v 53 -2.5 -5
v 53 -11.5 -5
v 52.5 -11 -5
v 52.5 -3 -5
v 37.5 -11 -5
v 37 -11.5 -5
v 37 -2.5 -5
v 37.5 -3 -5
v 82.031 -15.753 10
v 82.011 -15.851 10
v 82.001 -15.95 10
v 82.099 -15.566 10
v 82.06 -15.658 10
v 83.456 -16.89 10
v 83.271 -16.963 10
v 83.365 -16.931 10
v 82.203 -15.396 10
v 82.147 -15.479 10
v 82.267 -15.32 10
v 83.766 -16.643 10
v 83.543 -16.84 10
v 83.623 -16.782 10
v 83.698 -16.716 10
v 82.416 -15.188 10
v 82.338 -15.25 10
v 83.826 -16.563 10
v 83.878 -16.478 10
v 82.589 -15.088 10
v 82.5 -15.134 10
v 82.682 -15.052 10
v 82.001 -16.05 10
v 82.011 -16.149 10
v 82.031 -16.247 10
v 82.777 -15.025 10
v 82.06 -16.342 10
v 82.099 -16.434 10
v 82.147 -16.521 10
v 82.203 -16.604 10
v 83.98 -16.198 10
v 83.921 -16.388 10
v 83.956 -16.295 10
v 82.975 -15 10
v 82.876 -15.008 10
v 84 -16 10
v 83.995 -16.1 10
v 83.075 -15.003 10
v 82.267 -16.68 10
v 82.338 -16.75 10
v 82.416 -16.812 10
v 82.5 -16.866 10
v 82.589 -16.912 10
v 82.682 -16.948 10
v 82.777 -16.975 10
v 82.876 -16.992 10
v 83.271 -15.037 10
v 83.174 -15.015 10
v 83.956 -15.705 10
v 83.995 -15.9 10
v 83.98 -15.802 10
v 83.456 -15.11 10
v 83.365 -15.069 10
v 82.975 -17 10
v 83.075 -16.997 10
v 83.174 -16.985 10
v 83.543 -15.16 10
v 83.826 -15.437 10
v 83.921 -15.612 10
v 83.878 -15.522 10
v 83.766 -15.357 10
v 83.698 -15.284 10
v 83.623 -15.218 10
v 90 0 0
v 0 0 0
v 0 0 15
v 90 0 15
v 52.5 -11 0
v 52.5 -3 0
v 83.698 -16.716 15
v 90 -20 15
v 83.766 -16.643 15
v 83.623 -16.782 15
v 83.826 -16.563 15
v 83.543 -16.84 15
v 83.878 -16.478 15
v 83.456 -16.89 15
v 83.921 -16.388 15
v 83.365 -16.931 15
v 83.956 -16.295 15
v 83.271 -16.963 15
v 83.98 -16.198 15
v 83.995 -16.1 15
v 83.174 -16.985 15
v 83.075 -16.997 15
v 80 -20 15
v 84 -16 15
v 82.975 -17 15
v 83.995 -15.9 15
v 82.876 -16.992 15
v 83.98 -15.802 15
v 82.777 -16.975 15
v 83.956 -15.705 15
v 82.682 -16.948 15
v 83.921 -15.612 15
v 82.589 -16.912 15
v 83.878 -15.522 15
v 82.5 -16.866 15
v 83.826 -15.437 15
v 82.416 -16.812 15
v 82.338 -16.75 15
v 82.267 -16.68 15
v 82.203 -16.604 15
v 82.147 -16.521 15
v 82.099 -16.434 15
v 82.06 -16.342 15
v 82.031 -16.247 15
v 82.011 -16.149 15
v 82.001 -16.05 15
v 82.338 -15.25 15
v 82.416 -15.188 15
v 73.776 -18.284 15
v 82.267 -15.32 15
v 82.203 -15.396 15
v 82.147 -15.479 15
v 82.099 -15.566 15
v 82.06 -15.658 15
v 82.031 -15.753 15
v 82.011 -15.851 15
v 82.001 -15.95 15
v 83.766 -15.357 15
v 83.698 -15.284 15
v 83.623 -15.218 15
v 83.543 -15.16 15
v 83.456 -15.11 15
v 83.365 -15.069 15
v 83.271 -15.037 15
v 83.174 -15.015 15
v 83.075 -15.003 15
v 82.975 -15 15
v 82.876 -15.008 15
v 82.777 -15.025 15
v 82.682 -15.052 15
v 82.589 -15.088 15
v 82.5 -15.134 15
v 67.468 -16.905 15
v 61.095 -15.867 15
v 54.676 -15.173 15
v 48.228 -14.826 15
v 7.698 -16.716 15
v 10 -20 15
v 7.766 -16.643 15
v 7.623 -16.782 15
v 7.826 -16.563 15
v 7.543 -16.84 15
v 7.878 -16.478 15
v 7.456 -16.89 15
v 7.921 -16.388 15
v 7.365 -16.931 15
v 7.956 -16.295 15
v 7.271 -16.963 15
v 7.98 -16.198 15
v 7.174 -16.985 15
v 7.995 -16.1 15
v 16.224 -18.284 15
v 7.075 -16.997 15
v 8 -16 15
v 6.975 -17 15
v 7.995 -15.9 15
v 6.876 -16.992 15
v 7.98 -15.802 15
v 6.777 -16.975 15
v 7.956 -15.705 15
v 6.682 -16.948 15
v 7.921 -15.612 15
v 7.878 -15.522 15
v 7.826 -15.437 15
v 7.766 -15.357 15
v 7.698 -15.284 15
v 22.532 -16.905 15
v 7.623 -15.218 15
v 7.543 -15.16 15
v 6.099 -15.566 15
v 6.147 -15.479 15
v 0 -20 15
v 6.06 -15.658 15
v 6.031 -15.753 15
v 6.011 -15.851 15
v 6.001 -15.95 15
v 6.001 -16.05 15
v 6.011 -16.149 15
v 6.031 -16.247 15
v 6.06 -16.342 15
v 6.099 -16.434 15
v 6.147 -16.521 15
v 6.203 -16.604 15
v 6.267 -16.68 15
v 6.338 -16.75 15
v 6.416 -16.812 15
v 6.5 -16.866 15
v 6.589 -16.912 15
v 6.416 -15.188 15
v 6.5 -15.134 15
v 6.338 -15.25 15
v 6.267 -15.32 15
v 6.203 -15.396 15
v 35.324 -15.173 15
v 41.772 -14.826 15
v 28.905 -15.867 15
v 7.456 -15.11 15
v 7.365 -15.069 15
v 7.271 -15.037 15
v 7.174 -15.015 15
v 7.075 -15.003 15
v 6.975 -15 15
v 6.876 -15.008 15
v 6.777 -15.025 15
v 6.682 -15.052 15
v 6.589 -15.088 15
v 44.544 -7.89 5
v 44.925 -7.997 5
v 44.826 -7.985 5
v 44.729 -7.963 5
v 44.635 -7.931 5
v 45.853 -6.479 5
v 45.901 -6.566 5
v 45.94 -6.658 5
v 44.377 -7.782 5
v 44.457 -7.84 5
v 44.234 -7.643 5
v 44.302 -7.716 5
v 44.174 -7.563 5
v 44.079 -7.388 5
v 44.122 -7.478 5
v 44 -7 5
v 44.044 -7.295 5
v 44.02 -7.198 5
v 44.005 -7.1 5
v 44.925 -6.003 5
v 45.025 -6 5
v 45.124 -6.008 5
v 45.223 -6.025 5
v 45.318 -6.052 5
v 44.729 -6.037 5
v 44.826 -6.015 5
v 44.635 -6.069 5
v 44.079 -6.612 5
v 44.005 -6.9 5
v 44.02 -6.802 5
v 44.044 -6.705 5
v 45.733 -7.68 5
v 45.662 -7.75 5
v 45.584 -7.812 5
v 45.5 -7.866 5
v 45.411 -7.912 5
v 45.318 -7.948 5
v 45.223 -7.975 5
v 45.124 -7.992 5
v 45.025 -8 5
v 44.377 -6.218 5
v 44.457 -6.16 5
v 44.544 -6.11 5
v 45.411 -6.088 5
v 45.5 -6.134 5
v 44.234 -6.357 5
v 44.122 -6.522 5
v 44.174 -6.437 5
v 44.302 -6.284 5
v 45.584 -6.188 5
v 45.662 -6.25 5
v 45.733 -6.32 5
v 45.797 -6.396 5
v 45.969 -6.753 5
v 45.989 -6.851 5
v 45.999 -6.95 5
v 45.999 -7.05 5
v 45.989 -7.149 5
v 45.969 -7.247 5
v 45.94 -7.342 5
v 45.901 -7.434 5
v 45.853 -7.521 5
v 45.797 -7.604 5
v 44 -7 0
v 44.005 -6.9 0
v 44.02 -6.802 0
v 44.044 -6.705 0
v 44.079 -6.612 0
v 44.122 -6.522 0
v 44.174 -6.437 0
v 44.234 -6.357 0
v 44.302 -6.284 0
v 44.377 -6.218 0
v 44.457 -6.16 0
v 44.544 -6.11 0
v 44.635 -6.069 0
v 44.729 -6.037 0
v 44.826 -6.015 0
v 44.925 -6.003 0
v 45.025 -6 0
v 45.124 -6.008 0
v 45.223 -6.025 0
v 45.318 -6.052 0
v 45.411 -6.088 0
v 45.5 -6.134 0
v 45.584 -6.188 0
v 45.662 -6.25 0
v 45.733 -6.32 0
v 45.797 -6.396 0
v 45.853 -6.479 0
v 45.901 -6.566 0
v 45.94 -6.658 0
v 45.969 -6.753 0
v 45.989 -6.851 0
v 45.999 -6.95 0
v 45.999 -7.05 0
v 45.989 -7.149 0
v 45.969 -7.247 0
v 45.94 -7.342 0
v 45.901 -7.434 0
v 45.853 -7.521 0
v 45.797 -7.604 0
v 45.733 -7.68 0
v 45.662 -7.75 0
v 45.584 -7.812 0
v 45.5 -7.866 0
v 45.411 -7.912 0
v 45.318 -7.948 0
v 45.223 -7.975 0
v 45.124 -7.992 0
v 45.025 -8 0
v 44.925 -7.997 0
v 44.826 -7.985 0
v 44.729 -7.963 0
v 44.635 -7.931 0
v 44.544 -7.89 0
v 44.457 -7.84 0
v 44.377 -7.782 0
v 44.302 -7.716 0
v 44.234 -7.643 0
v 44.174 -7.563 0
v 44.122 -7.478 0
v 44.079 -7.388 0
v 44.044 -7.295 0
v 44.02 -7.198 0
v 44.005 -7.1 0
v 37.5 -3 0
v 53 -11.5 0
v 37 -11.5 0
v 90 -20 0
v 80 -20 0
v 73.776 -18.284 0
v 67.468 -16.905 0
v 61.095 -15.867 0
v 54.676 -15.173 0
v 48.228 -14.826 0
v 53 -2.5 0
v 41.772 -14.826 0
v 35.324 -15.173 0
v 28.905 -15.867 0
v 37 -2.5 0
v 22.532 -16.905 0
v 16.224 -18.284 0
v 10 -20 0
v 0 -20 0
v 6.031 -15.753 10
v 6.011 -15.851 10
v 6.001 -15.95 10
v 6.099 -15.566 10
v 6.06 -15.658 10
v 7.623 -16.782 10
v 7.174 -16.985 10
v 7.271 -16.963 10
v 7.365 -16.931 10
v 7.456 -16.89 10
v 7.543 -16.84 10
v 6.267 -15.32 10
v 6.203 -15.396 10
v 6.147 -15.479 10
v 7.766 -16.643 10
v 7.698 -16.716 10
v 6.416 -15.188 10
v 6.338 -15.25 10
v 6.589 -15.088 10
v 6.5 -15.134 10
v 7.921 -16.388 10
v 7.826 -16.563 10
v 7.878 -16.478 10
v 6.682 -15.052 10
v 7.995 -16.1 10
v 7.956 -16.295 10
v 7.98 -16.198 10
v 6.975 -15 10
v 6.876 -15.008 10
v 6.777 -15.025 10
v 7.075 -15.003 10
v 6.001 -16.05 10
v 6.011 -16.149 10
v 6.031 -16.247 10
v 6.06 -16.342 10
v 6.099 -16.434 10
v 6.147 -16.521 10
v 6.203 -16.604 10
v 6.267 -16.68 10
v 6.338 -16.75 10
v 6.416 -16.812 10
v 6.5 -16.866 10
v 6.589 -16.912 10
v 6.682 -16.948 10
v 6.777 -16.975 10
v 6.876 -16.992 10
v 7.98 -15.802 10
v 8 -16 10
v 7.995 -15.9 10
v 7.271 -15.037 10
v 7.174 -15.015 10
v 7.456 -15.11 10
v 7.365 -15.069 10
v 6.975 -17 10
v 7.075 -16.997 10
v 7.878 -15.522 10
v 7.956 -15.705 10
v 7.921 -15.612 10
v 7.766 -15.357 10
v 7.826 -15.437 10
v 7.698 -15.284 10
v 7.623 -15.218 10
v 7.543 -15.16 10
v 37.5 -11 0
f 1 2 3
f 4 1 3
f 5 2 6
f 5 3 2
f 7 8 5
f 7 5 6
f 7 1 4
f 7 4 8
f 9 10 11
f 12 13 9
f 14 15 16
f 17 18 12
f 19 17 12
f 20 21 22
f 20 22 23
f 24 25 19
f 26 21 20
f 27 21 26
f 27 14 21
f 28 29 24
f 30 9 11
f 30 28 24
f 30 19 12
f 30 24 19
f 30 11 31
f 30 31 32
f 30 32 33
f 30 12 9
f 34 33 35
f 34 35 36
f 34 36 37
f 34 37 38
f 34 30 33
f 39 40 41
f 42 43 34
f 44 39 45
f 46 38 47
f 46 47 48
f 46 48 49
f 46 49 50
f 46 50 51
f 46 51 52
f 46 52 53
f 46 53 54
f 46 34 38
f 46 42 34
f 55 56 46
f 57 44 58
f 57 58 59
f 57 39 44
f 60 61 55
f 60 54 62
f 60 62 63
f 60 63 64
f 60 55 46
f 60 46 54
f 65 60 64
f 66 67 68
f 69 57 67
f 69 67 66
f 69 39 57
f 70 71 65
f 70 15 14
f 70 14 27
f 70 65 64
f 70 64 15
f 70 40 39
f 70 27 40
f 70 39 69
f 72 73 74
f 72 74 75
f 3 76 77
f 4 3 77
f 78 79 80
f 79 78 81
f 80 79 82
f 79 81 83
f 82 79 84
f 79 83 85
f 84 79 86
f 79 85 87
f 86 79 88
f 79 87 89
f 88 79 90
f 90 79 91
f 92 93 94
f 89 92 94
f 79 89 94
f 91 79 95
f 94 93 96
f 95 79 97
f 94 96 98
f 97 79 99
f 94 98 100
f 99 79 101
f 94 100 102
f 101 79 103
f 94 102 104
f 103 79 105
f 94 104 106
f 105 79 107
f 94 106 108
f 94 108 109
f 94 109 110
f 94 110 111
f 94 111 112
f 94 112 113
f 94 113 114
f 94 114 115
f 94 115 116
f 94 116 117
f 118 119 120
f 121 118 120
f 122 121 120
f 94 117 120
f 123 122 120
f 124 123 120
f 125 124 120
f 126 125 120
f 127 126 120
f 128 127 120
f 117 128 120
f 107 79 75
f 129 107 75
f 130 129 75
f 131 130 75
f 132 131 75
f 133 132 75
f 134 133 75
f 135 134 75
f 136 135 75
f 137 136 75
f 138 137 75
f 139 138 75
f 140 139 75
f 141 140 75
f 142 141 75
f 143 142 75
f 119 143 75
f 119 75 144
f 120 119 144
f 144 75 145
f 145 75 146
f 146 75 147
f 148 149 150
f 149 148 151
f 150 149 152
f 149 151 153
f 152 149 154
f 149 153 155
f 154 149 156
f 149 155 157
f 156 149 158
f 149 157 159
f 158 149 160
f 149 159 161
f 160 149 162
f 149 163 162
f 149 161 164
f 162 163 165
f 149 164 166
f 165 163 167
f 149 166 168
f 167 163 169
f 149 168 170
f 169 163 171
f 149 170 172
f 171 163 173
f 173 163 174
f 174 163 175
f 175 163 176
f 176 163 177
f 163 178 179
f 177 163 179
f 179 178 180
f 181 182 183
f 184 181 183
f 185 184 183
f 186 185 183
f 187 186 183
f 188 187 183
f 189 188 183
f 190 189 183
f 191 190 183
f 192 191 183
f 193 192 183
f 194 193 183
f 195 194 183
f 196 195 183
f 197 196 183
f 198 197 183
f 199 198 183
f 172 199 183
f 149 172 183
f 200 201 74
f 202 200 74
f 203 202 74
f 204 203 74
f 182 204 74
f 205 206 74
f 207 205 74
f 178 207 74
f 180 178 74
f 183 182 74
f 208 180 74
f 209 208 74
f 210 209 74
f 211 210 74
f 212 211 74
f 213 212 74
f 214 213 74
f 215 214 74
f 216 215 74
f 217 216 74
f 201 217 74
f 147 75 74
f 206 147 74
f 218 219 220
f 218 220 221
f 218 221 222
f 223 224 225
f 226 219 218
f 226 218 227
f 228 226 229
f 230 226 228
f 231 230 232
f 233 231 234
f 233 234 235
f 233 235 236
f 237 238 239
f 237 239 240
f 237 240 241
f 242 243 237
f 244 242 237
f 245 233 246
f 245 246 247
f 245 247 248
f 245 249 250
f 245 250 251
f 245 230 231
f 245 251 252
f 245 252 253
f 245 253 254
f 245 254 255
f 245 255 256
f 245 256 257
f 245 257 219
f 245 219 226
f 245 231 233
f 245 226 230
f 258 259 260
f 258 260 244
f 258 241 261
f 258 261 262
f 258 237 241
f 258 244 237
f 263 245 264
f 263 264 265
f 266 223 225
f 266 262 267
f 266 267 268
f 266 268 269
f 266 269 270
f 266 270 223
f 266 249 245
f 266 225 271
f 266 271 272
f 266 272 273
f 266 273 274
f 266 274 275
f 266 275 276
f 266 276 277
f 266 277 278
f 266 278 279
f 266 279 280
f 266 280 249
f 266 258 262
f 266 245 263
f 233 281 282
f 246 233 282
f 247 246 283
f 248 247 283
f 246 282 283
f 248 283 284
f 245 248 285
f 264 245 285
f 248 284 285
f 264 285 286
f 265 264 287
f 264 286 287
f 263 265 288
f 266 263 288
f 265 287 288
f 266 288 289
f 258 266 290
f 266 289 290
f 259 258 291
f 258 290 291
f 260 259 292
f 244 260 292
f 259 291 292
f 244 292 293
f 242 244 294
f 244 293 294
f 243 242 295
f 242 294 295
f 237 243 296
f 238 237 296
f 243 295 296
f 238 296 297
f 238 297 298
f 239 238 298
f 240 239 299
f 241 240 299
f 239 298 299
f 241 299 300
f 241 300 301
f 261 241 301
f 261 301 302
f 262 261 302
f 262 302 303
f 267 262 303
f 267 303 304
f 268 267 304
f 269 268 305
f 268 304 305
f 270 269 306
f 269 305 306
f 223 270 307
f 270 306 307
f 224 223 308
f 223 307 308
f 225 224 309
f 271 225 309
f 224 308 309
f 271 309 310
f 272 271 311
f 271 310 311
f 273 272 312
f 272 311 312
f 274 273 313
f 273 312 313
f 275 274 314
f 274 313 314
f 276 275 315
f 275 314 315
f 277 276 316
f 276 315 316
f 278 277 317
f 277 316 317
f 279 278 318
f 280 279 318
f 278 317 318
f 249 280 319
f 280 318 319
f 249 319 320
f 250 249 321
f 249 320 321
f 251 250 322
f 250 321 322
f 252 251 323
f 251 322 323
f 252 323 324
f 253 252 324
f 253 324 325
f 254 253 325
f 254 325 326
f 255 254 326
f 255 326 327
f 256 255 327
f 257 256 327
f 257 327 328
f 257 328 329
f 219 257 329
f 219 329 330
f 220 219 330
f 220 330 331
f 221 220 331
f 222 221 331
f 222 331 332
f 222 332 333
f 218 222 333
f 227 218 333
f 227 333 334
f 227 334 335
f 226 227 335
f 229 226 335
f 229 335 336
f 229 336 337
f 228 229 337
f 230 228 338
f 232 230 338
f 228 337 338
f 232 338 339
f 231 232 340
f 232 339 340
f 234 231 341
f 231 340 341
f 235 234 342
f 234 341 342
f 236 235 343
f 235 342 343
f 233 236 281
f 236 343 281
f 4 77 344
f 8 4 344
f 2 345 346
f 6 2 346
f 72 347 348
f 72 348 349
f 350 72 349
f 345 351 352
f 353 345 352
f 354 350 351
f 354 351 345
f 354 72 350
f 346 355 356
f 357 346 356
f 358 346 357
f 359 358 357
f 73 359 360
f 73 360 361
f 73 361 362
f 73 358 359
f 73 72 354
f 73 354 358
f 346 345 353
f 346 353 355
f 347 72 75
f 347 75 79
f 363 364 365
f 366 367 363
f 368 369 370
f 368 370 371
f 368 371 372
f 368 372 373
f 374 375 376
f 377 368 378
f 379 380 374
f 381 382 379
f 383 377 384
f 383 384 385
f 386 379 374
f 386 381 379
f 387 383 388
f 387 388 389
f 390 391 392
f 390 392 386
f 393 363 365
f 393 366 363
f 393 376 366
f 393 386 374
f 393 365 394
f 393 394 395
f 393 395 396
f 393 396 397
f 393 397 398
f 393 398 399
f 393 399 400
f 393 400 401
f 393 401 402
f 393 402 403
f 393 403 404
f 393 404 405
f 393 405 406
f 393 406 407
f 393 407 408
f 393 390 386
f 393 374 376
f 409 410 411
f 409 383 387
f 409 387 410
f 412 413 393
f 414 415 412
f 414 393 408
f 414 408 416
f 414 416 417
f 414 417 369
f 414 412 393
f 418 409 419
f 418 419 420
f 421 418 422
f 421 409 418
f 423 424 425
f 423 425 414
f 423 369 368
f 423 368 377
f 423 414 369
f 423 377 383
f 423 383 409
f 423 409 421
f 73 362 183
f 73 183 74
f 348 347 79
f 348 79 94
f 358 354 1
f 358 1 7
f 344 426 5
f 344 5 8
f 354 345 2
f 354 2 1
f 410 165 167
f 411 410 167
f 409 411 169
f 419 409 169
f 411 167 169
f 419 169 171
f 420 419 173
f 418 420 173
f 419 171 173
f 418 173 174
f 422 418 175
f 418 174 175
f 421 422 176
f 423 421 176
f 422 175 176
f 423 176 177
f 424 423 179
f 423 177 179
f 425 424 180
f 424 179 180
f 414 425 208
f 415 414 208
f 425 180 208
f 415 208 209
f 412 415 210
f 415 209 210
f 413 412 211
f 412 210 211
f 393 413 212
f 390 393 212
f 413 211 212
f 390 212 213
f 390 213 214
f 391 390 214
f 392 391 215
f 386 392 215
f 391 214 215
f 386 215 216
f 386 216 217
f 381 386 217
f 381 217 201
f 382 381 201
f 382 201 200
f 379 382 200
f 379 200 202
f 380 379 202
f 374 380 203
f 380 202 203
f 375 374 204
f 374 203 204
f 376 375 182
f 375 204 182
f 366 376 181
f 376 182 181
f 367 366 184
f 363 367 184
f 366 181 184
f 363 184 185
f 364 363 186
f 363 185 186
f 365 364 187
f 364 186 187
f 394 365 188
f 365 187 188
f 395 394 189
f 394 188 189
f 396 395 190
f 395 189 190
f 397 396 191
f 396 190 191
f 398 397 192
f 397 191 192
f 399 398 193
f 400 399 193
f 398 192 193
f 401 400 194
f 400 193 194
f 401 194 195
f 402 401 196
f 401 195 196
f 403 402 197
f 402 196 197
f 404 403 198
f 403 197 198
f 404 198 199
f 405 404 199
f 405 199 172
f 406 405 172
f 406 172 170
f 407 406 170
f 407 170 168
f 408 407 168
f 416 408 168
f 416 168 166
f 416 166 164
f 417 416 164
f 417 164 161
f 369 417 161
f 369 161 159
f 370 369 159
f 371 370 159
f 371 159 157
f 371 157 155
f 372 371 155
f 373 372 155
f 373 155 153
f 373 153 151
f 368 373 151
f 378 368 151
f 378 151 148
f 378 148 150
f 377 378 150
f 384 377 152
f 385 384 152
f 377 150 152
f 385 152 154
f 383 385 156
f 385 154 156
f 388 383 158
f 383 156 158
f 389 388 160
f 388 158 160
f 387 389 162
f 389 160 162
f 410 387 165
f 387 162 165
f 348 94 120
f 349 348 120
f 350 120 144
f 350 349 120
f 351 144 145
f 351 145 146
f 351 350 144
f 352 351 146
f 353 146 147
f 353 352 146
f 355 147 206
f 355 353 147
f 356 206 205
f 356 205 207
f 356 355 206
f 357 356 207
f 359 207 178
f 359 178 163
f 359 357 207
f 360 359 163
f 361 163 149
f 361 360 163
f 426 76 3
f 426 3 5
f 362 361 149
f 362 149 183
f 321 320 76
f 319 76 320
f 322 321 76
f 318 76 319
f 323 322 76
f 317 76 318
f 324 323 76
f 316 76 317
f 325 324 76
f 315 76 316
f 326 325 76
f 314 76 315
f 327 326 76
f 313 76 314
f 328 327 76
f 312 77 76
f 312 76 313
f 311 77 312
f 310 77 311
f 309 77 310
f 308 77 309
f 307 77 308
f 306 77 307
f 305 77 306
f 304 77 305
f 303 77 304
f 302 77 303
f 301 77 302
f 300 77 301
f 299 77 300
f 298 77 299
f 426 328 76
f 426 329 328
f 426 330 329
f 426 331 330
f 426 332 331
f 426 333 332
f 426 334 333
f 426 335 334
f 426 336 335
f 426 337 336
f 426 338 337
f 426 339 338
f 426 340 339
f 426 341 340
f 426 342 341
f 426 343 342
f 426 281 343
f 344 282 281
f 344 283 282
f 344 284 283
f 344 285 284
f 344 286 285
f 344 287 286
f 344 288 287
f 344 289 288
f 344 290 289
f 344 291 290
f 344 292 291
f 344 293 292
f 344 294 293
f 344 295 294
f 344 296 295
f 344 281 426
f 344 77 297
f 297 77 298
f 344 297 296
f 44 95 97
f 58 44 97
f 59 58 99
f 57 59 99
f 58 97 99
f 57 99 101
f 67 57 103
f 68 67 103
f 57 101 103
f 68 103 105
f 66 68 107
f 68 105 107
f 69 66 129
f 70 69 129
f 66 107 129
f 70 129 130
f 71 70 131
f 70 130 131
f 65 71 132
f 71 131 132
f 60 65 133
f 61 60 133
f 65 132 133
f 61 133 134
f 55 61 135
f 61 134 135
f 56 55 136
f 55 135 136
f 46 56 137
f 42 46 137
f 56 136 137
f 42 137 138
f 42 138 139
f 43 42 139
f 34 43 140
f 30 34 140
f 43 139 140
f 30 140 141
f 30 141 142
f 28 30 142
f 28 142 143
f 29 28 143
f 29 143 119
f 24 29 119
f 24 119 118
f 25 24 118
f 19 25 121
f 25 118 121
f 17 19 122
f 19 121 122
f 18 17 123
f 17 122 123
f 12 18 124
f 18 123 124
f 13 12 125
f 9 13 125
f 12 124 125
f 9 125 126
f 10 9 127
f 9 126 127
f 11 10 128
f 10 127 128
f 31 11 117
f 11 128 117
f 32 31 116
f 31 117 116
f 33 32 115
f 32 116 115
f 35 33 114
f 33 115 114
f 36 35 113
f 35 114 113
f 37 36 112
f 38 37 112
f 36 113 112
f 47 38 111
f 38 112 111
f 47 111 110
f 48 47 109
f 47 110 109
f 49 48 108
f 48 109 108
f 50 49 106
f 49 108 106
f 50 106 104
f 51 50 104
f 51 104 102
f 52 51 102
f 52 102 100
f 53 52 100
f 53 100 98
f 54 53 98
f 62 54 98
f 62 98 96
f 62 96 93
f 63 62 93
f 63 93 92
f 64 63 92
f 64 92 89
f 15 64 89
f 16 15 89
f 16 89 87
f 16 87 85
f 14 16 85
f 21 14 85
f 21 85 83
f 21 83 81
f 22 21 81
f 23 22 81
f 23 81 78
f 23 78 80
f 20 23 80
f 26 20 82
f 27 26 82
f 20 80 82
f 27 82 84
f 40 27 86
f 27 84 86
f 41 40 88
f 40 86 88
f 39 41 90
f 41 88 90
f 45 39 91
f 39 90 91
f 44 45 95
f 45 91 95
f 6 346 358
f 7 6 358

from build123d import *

# Parameters (mm, degrees)
BOSS_EXTRUDE1_DEPTH = 15
SKETCH2_R           = 1
CUT_EXTRUDE1_DEPTH  = 5
SKETCH3_W           = 16
SKETCH3_H           = 9
SKETCH3_W_2         = 15
SKETCH3_H_2         = 8
BOSS_EXTRUDE2_DEPTH = 5
SKETCH4_R           = 1
CUT_EXTRUDE2_DEPTH  = 5


with BuildPart() as part:
    # Sketch1 → Boss-Extrude1 (new body)
    with BuildSketch(Plane.XY):
        with BuildLine():
            Line((0, 0), (90, 0))
            Line((90, 0), (90, -20))
            Line((90, -20), (80, -20))
            ThreePointArc((80, -20), (45, -14.782402832), (10, -20))
            Line((10, -20), (0, -20))
            Line((0, -20), (0, 0))
        make_face()
    extrude(amount=BOSS_EXTRUDE1_DEPTH)

    # Sketch2 → Cut-Extrude1 (cut)
    with BuildSketch(Plane.XY.offset(15)):
        with Locations((7, -16)):
            Circle(SKETCH2_R)
        with Locations((83, -16)):
            Circle(SKETCH2_R)
    extrude(amount=-CUT_EXTRUDE1_DEPTH, mode=Mode.SUBTRACT)

    # Sketch3 → Boss-Extrude2 (add)
    with BuildSketch(Plane(origin=(0, 0, 0), x_dir=(-1, 0, 0), z_dir=(0, 0, -1))):
        with Locations((-45, -7)):
            Rectangle(SKETCH3_W, SKETCH3_H)
        with Locations((-45, -7)):
            Rectangle(SKETCH3_W_2, SKETCH3_H_2, mode=Mode.SUBTRACT)
    extrude(amount=BOSS_EXTRUDE2_DEPTH)

    # Sketch4 → Cut-Extrude2 (cut)
    with BuildSketch(Plane(origin=(0, 0, 0), x_dir=(-1, 0, 0), z_dir=(0, 0, -1))):
        with Locations((-45, -7)):
            Circle(SKETCH4_R)
    extrude(amount=-CUT_EXTRUDE2_DEPTH, mode=Mode.SUBTRACT)


solid = part.part
